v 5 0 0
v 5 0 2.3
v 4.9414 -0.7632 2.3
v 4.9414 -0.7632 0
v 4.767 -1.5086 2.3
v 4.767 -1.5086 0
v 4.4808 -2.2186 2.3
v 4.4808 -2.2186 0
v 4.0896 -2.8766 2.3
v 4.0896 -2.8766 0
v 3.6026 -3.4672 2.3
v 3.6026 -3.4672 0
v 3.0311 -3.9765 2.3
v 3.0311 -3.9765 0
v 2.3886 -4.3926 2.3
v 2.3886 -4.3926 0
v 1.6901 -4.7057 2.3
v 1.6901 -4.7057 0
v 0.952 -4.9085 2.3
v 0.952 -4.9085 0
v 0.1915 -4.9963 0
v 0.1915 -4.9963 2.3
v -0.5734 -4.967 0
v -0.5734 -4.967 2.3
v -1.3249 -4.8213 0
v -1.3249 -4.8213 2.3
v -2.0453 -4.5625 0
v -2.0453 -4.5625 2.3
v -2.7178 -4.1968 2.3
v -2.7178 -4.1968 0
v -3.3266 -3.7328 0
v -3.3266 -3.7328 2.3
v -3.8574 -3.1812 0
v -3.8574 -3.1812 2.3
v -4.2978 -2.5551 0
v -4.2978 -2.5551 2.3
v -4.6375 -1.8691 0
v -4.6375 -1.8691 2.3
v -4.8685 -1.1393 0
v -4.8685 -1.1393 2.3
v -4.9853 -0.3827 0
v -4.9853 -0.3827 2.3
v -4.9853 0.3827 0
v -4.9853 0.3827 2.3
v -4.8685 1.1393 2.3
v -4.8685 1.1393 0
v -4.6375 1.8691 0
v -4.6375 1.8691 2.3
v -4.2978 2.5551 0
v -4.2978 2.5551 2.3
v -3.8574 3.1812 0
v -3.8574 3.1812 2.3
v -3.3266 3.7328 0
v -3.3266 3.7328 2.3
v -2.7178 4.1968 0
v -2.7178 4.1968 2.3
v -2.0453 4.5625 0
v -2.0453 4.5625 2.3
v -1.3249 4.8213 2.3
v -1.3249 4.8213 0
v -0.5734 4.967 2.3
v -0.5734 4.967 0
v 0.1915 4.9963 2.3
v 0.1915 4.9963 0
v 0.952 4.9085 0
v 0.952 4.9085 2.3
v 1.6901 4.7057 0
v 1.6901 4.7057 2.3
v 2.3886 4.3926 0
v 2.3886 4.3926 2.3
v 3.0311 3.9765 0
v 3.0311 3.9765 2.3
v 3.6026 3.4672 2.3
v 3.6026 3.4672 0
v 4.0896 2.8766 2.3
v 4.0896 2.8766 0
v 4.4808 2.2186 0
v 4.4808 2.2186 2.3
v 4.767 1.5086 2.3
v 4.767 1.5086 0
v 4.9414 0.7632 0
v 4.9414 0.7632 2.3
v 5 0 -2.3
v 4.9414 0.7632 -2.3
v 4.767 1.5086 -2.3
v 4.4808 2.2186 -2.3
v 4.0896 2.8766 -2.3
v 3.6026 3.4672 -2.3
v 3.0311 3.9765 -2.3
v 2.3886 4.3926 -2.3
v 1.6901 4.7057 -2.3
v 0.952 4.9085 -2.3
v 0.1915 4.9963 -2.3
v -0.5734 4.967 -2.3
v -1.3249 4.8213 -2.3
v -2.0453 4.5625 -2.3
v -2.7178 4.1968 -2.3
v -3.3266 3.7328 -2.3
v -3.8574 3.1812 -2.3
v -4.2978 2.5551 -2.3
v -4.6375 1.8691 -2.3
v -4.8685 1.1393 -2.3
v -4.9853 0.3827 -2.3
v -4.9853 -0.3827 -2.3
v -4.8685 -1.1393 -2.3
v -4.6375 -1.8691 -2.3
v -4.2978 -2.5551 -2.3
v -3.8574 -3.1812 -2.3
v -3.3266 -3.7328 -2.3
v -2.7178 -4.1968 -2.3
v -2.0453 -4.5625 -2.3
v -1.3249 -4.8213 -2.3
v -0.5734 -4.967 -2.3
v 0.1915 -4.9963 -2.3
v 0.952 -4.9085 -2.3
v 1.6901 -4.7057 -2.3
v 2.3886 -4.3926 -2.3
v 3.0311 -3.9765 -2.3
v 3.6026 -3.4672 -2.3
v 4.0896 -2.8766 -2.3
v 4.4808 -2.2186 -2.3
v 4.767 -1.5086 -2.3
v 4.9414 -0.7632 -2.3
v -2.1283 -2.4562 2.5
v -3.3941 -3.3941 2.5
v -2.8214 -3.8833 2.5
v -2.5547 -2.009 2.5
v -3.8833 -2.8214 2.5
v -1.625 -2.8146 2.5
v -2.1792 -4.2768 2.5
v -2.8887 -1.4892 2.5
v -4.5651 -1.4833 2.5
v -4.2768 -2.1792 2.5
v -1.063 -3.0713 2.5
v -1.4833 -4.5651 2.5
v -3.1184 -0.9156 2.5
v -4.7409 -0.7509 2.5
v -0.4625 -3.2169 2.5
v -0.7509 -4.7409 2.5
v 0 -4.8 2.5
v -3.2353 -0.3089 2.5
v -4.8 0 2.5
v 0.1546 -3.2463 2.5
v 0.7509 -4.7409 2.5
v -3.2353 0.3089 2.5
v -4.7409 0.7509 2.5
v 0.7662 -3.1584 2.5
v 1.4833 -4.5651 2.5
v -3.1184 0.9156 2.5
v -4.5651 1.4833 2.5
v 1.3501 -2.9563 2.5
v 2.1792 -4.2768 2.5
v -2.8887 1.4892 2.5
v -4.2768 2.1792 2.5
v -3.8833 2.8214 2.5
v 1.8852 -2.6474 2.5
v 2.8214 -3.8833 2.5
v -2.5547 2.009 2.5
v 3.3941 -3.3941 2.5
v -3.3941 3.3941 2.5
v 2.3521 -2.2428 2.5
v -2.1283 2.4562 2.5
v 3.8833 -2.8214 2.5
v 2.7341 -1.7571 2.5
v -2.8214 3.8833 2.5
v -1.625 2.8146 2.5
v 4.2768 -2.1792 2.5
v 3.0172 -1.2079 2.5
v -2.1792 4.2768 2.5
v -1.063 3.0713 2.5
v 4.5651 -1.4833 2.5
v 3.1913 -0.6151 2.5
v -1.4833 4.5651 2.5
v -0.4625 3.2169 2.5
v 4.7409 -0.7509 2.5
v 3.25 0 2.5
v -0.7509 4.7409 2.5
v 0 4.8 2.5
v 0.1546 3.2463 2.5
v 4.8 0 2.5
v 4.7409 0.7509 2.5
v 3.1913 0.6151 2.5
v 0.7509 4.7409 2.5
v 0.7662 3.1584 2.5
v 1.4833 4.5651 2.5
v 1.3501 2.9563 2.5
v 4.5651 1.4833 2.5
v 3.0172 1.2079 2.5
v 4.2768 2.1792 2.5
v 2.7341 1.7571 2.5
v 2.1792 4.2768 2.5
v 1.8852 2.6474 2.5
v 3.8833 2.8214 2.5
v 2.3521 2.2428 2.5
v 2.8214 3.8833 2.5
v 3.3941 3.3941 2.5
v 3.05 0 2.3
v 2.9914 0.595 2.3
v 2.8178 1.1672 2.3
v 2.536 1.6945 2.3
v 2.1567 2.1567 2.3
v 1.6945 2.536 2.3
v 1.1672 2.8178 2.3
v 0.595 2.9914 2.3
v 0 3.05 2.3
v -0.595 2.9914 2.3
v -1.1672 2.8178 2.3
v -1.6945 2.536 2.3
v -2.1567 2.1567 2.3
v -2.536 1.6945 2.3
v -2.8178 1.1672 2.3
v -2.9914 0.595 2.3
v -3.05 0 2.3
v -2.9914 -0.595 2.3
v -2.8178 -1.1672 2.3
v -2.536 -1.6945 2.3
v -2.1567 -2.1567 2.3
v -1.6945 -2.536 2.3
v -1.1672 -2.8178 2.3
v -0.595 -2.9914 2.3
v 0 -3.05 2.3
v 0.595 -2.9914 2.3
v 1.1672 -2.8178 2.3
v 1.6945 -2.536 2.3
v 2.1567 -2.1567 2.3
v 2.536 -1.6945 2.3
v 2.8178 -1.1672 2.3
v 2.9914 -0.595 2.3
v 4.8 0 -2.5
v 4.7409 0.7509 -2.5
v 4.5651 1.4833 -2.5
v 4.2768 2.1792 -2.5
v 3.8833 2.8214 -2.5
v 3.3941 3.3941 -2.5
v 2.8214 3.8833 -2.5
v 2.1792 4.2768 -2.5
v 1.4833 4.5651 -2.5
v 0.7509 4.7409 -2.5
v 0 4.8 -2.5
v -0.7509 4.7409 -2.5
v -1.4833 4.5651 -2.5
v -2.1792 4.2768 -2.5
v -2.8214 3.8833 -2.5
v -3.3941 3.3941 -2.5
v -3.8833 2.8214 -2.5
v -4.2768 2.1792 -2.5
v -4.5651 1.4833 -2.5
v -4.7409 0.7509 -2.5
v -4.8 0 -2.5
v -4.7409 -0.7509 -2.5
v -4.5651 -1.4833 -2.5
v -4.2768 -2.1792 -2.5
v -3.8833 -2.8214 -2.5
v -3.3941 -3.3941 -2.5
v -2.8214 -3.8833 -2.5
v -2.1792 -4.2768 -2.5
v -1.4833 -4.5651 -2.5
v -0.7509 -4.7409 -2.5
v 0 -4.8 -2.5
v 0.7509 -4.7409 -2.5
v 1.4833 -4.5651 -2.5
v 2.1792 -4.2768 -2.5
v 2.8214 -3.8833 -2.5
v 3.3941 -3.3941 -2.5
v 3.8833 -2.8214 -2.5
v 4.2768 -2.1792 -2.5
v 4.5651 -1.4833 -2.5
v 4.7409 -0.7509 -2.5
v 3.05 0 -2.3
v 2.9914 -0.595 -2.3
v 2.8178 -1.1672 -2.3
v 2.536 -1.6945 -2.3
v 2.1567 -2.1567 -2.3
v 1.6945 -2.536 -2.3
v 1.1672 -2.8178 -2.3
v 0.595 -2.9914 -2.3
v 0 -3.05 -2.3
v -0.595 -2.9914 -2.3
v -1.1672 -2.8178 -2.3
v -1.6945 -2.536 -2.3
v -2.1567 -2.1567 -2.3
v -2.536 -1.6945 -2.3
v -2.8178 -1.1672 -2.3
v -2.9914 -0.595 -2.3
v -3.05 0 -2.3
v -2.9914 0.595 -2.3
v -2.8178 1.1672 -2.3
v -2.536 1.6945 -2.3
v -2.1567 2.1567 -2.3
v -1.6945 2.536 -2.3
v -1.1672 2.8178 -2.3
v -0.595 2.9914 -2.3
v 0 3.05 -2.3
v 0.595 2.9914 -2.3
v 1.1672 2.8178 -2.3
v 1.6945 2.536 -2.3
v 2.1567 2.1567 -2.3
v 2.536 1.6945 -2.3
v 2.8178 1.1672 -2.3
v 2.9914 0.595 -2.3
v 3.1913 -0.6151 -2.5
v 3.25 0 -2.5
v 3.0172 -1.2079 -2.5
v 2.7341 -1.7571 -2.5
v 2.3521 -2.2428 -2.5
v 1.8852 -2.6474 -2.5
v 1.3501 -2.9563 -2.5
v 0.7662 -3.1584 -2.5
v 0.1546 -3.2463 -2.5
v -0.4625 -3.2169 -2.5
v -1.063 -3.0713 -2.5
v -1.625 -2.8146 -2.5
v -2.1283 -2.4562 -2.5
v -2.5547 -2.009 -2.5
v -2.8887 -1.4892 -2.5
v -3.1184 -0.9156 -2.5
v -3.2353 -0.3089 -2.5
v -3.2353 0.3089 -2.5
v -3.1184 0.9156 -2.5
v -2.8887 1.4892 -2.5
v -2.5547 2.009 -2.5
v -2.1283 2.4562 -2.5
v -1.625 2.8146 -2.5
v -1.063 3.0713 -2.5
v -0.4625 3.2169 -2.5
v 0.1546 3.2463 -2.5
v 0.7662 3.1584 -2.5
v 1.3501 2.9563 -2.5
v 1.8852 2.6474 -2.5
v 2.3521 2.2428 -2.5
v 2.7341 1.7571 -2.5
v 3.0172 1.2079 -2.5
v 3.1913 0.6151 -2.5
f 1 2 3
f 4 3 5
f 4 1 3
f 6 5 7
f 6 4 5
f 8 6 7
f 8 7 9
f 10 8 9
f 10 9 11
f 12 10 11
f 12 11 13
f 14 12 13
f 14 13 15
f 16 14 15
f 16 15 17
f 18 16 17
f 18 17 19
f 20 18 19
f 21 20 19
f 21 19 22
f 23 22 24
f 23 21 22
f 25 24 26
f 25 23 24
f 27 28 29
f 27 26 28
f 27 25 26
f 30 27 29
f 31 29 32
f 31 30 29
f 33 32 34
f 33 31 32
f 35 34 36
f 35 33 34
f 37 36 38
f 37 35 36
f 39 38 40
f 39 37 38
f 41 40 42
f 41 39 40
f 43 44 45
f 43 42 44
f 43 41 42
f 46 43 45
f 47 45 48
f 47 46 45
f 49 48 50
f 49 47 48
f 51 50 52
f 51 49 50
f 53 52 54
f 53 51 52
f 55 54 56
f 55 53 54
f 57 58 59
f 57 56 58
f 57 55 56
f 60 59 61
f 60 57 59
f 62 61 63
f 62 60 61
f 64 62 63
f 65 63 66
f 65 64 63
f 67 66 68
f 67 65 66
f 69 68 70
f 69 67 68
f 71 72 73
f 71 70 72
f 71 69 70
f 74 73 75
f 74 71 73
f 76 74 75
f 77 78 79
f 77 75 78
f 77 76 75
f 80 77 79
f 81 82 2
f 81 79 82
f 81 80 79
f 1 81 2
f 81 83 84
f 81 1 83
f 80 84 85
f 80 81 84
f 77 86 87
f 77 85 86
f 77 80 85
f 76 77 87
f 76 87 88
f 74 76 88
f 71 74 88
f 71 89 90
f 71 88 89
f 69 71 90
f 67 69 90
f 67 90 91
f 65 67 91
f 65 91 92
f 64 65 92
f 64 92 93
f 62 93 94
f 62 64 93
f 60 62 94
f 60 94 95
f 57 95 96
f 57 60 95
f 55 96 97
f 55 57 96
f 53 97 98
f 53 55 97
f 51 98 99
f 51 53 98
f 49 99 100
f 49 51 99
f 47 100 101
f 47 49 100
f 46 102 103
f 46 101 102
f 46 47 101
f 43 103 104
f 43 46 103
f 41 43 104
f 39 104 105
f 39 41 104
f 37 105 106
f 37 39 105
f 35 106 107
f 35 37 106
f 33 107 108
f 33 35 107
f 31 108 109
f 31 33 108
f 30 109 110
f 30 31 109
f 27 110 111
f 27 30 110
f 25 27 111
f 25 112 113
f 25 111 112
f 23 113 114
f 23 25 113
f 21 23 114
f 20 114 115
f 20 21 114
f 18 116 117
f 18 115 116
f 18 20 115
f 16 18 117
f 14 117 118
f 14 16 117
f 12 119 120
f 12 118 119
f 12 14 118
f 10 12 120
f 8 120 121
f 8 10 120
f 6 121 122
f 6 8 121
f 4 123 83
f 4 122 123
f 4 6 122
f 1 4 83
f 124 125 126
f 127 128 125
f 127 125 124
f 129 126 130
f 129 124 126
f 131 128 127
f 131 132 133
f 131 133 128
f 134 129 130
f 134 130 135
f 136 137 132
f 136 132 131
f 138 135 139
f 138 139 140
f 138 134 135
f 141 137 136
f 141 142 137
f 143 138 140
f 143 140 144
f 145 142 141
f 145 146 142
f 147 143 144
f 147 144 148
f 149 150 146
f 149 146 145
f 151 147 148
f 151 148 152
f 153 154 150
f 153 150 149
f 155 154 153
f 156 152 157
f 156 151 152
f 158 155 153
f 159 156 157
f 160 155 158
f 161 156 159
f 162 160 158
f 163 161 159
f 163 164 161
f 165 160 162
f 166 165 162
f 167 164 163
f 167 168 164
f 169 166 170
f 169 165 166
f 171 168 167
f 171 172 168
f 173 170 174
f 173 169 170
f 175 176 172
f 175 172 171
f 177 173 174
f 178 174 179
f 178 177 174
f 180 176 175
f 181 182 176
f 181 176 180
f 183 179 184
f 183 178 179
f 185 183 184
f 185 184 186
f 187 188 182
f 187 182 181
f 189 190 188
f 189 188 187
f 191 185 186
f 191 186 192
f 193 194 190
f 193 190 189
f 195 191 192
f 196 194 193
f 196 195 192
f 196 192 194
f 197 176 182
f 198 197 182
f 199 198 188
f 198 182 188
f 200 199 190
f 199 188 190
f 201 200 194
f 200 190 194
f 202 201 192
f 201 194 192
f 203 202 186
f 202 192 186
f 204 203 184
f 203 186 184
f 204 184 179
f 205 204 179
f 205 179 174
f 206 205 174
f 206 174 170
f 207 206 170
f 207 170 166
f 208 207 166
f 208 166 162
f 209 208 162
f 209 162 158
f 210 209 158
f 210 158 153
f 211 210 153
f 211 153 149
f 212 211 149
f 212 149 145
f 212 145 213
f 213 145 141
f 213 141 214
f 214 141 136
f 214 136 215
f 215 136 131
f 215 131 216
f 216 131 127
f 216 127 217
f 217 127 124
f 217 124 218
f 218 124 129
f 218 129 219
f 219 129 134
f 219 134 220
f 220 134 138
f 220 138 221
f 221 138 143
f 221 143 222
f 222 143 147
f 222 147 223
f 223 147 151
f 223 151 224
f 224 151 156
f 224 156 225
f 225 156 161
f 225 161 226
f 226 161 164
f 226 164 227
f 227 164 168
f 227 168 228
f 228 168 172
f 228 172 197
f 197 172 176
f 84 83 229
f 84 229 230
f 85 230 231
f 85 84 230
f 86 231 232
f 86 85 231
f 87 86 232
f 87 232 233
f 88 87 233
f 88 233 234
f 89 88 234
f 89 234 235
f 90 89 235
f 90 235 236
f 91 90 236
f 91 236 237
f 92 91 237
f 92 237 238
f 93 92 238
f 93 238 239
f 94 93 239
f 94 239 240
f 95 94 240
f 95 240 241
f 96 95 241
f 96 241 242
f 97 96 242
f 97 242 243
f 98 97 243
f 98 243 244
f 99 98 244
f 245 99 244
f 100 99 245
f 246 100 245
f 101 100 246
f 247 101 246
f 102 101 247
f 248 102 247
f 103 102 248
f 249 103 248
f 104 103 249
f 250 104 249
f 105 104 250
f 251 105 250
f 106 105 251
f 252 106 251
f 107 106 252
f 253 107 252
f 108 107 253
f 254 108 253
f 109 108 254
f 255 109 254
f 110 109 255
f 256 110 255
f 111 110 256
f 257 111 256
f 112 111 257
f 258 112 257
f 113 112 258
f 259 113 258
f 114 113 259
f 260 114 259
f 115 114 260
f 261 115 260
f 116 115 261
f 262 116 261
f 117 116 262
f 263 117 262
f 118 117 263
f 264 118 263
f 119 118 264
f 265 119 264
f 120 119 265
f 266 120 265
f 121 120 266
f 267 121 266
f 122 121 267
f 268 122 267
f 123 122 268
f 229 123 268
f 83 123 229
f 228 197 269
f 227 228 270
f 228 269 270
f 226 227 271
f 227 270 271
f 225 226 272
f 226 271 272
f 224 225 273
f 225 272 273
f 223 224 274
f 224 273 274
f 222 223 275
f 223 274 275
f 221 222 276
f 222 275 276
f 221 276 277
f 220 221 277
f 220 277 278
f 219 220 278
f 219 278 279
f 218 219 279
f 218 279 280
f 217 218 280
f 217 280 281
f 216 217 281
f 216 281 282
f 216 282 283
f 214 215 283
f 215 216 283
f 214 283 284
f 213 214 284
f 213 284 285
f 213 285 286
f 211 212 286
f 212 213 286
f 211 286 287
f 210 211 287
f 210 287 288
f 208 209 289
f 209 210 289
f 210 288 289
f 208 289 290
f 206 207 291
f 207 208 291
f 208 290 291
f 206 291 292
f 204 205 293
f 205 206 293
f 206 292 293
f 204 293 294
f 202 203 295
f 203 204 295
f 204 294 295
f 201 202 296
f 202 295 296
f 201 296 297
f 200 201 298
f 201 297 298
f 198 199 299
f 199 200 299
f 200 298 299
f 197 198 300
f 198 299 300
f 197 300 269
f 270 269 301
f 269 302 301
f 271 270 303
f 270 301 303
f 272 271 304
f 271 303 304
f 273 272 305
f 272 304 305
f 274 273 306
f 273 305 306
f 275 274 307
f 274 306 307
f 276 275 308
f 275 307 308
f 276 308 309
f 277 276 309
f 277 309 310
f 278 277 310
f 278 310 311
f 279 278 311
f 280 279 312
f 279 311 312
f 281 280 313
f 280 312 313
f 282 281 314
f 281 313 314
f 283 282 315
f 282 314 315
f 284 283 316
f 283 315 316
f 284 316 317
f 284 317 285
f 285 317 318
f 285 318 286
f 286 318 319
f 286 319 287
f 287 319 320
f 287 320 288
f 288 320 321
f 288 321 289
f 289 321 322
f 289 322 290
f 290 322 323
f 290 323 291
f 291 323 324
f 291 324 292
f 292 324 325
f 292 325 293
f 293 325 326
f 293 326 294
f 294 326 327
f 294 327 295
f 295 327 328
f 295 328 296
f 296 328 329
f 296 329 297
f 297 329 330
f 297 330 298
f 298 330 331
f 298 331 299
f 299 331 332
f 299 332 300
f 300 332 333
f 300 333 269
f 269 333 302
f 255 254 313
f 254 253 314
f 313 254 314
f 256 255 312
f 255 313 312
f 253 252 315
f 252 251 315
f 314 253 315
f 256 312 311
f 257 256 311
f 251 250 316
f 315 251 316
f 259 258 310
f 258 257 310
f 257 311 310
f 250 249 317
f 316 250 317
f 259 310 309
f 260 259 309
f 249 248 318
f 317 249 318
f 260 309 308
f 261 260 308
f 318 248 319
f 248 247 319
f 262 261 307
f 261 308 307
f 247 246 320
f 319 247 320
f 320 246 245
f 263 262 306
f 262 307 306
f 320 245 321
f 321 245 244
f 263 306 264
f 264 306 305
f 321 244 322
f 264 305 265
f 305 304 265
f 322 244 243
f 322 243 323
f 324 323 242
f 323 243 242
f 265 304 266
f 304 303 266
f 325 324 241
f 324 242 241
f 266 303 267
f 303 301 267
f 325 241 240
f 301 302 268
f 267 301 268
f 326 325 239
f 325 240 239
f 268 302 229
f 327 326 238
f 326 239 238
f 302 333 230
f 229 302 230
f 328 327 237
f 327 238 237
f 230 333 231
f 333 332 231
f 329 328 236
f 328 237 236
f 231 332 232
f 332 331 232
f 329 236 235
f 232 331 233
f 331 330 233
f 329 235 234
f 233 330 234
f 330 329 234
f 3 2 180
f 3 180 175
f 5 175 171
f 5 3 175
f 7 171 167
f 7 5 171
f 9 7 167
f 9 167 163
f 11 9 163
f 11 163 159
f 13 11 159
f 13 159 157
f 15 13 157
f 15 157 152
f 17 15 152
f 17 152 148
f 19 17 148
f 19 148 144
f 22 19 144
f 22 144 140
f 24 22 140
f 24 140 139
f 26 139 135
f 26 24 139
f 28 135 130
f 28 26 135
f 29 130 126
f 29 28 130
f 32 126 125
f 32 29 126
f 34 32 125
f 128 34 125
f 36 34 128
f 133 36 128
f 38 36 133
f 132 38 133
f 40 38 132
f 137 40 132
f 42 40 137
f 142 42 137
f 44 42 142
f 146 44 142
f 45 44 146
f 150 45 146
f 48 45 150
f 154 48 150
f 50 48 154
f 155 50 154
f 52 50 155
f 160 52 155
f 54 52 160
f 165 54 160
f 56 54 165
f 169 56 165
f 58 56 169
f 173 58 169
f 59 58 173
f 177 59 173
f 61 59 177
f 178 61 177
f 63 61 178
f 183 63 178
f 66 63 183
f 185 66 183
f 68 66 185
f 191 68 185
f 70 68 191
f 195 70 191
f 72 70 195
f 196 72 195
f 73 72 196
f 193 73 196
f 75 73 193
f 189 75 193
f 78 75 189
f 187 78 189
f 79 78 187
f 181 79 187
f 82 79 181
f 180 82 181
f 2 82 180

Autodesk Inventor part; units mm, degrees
ref_plane "YZ Plane" through (0, 0, 0) normal (1, 0, 0) x (0, 1, 0)
ref_plane "XZ Plane" through (0, 0, 0) normal (0, 1, 0) x (-1, 0, 0)
ref_plane "XY Plane" through (0, 0, 0) normal (0, 0, 1) x (1, 0, 0)
sketch "Skizze2" plane through (0, 0, 0) normal (0, 0, 1) x (1, 0, 0)
  line L0 (-7, 0) -> (7, 0) projected
  line L1 (0, 7) -> (0, -7) projected
  circle A0 centre (0, 0) radius 5
  circle A1 centre (0, 0) radius 3.05
  dimension "d13" = 10
  dimension "d14" = 6.1
extrude "Grundkörper" add sketch "Skizze2" along normal mid plane 5 contours A1 L1 A0 L0 | L0 A0 L1 A1 | A1 L0 A0 L1 | L1 A0 L0 A1
chamfer "Fase_Allgemein" distance 0.2 angle 45 4 edges at (-3.05, 0, 2.5) (-5, 0, 2.5) (-3.05, 0, -2.5) (-5, 0, -2.5)
properties part number "200-60-DIFFERENTIAL-BAR-04" material "Edelstahl"
